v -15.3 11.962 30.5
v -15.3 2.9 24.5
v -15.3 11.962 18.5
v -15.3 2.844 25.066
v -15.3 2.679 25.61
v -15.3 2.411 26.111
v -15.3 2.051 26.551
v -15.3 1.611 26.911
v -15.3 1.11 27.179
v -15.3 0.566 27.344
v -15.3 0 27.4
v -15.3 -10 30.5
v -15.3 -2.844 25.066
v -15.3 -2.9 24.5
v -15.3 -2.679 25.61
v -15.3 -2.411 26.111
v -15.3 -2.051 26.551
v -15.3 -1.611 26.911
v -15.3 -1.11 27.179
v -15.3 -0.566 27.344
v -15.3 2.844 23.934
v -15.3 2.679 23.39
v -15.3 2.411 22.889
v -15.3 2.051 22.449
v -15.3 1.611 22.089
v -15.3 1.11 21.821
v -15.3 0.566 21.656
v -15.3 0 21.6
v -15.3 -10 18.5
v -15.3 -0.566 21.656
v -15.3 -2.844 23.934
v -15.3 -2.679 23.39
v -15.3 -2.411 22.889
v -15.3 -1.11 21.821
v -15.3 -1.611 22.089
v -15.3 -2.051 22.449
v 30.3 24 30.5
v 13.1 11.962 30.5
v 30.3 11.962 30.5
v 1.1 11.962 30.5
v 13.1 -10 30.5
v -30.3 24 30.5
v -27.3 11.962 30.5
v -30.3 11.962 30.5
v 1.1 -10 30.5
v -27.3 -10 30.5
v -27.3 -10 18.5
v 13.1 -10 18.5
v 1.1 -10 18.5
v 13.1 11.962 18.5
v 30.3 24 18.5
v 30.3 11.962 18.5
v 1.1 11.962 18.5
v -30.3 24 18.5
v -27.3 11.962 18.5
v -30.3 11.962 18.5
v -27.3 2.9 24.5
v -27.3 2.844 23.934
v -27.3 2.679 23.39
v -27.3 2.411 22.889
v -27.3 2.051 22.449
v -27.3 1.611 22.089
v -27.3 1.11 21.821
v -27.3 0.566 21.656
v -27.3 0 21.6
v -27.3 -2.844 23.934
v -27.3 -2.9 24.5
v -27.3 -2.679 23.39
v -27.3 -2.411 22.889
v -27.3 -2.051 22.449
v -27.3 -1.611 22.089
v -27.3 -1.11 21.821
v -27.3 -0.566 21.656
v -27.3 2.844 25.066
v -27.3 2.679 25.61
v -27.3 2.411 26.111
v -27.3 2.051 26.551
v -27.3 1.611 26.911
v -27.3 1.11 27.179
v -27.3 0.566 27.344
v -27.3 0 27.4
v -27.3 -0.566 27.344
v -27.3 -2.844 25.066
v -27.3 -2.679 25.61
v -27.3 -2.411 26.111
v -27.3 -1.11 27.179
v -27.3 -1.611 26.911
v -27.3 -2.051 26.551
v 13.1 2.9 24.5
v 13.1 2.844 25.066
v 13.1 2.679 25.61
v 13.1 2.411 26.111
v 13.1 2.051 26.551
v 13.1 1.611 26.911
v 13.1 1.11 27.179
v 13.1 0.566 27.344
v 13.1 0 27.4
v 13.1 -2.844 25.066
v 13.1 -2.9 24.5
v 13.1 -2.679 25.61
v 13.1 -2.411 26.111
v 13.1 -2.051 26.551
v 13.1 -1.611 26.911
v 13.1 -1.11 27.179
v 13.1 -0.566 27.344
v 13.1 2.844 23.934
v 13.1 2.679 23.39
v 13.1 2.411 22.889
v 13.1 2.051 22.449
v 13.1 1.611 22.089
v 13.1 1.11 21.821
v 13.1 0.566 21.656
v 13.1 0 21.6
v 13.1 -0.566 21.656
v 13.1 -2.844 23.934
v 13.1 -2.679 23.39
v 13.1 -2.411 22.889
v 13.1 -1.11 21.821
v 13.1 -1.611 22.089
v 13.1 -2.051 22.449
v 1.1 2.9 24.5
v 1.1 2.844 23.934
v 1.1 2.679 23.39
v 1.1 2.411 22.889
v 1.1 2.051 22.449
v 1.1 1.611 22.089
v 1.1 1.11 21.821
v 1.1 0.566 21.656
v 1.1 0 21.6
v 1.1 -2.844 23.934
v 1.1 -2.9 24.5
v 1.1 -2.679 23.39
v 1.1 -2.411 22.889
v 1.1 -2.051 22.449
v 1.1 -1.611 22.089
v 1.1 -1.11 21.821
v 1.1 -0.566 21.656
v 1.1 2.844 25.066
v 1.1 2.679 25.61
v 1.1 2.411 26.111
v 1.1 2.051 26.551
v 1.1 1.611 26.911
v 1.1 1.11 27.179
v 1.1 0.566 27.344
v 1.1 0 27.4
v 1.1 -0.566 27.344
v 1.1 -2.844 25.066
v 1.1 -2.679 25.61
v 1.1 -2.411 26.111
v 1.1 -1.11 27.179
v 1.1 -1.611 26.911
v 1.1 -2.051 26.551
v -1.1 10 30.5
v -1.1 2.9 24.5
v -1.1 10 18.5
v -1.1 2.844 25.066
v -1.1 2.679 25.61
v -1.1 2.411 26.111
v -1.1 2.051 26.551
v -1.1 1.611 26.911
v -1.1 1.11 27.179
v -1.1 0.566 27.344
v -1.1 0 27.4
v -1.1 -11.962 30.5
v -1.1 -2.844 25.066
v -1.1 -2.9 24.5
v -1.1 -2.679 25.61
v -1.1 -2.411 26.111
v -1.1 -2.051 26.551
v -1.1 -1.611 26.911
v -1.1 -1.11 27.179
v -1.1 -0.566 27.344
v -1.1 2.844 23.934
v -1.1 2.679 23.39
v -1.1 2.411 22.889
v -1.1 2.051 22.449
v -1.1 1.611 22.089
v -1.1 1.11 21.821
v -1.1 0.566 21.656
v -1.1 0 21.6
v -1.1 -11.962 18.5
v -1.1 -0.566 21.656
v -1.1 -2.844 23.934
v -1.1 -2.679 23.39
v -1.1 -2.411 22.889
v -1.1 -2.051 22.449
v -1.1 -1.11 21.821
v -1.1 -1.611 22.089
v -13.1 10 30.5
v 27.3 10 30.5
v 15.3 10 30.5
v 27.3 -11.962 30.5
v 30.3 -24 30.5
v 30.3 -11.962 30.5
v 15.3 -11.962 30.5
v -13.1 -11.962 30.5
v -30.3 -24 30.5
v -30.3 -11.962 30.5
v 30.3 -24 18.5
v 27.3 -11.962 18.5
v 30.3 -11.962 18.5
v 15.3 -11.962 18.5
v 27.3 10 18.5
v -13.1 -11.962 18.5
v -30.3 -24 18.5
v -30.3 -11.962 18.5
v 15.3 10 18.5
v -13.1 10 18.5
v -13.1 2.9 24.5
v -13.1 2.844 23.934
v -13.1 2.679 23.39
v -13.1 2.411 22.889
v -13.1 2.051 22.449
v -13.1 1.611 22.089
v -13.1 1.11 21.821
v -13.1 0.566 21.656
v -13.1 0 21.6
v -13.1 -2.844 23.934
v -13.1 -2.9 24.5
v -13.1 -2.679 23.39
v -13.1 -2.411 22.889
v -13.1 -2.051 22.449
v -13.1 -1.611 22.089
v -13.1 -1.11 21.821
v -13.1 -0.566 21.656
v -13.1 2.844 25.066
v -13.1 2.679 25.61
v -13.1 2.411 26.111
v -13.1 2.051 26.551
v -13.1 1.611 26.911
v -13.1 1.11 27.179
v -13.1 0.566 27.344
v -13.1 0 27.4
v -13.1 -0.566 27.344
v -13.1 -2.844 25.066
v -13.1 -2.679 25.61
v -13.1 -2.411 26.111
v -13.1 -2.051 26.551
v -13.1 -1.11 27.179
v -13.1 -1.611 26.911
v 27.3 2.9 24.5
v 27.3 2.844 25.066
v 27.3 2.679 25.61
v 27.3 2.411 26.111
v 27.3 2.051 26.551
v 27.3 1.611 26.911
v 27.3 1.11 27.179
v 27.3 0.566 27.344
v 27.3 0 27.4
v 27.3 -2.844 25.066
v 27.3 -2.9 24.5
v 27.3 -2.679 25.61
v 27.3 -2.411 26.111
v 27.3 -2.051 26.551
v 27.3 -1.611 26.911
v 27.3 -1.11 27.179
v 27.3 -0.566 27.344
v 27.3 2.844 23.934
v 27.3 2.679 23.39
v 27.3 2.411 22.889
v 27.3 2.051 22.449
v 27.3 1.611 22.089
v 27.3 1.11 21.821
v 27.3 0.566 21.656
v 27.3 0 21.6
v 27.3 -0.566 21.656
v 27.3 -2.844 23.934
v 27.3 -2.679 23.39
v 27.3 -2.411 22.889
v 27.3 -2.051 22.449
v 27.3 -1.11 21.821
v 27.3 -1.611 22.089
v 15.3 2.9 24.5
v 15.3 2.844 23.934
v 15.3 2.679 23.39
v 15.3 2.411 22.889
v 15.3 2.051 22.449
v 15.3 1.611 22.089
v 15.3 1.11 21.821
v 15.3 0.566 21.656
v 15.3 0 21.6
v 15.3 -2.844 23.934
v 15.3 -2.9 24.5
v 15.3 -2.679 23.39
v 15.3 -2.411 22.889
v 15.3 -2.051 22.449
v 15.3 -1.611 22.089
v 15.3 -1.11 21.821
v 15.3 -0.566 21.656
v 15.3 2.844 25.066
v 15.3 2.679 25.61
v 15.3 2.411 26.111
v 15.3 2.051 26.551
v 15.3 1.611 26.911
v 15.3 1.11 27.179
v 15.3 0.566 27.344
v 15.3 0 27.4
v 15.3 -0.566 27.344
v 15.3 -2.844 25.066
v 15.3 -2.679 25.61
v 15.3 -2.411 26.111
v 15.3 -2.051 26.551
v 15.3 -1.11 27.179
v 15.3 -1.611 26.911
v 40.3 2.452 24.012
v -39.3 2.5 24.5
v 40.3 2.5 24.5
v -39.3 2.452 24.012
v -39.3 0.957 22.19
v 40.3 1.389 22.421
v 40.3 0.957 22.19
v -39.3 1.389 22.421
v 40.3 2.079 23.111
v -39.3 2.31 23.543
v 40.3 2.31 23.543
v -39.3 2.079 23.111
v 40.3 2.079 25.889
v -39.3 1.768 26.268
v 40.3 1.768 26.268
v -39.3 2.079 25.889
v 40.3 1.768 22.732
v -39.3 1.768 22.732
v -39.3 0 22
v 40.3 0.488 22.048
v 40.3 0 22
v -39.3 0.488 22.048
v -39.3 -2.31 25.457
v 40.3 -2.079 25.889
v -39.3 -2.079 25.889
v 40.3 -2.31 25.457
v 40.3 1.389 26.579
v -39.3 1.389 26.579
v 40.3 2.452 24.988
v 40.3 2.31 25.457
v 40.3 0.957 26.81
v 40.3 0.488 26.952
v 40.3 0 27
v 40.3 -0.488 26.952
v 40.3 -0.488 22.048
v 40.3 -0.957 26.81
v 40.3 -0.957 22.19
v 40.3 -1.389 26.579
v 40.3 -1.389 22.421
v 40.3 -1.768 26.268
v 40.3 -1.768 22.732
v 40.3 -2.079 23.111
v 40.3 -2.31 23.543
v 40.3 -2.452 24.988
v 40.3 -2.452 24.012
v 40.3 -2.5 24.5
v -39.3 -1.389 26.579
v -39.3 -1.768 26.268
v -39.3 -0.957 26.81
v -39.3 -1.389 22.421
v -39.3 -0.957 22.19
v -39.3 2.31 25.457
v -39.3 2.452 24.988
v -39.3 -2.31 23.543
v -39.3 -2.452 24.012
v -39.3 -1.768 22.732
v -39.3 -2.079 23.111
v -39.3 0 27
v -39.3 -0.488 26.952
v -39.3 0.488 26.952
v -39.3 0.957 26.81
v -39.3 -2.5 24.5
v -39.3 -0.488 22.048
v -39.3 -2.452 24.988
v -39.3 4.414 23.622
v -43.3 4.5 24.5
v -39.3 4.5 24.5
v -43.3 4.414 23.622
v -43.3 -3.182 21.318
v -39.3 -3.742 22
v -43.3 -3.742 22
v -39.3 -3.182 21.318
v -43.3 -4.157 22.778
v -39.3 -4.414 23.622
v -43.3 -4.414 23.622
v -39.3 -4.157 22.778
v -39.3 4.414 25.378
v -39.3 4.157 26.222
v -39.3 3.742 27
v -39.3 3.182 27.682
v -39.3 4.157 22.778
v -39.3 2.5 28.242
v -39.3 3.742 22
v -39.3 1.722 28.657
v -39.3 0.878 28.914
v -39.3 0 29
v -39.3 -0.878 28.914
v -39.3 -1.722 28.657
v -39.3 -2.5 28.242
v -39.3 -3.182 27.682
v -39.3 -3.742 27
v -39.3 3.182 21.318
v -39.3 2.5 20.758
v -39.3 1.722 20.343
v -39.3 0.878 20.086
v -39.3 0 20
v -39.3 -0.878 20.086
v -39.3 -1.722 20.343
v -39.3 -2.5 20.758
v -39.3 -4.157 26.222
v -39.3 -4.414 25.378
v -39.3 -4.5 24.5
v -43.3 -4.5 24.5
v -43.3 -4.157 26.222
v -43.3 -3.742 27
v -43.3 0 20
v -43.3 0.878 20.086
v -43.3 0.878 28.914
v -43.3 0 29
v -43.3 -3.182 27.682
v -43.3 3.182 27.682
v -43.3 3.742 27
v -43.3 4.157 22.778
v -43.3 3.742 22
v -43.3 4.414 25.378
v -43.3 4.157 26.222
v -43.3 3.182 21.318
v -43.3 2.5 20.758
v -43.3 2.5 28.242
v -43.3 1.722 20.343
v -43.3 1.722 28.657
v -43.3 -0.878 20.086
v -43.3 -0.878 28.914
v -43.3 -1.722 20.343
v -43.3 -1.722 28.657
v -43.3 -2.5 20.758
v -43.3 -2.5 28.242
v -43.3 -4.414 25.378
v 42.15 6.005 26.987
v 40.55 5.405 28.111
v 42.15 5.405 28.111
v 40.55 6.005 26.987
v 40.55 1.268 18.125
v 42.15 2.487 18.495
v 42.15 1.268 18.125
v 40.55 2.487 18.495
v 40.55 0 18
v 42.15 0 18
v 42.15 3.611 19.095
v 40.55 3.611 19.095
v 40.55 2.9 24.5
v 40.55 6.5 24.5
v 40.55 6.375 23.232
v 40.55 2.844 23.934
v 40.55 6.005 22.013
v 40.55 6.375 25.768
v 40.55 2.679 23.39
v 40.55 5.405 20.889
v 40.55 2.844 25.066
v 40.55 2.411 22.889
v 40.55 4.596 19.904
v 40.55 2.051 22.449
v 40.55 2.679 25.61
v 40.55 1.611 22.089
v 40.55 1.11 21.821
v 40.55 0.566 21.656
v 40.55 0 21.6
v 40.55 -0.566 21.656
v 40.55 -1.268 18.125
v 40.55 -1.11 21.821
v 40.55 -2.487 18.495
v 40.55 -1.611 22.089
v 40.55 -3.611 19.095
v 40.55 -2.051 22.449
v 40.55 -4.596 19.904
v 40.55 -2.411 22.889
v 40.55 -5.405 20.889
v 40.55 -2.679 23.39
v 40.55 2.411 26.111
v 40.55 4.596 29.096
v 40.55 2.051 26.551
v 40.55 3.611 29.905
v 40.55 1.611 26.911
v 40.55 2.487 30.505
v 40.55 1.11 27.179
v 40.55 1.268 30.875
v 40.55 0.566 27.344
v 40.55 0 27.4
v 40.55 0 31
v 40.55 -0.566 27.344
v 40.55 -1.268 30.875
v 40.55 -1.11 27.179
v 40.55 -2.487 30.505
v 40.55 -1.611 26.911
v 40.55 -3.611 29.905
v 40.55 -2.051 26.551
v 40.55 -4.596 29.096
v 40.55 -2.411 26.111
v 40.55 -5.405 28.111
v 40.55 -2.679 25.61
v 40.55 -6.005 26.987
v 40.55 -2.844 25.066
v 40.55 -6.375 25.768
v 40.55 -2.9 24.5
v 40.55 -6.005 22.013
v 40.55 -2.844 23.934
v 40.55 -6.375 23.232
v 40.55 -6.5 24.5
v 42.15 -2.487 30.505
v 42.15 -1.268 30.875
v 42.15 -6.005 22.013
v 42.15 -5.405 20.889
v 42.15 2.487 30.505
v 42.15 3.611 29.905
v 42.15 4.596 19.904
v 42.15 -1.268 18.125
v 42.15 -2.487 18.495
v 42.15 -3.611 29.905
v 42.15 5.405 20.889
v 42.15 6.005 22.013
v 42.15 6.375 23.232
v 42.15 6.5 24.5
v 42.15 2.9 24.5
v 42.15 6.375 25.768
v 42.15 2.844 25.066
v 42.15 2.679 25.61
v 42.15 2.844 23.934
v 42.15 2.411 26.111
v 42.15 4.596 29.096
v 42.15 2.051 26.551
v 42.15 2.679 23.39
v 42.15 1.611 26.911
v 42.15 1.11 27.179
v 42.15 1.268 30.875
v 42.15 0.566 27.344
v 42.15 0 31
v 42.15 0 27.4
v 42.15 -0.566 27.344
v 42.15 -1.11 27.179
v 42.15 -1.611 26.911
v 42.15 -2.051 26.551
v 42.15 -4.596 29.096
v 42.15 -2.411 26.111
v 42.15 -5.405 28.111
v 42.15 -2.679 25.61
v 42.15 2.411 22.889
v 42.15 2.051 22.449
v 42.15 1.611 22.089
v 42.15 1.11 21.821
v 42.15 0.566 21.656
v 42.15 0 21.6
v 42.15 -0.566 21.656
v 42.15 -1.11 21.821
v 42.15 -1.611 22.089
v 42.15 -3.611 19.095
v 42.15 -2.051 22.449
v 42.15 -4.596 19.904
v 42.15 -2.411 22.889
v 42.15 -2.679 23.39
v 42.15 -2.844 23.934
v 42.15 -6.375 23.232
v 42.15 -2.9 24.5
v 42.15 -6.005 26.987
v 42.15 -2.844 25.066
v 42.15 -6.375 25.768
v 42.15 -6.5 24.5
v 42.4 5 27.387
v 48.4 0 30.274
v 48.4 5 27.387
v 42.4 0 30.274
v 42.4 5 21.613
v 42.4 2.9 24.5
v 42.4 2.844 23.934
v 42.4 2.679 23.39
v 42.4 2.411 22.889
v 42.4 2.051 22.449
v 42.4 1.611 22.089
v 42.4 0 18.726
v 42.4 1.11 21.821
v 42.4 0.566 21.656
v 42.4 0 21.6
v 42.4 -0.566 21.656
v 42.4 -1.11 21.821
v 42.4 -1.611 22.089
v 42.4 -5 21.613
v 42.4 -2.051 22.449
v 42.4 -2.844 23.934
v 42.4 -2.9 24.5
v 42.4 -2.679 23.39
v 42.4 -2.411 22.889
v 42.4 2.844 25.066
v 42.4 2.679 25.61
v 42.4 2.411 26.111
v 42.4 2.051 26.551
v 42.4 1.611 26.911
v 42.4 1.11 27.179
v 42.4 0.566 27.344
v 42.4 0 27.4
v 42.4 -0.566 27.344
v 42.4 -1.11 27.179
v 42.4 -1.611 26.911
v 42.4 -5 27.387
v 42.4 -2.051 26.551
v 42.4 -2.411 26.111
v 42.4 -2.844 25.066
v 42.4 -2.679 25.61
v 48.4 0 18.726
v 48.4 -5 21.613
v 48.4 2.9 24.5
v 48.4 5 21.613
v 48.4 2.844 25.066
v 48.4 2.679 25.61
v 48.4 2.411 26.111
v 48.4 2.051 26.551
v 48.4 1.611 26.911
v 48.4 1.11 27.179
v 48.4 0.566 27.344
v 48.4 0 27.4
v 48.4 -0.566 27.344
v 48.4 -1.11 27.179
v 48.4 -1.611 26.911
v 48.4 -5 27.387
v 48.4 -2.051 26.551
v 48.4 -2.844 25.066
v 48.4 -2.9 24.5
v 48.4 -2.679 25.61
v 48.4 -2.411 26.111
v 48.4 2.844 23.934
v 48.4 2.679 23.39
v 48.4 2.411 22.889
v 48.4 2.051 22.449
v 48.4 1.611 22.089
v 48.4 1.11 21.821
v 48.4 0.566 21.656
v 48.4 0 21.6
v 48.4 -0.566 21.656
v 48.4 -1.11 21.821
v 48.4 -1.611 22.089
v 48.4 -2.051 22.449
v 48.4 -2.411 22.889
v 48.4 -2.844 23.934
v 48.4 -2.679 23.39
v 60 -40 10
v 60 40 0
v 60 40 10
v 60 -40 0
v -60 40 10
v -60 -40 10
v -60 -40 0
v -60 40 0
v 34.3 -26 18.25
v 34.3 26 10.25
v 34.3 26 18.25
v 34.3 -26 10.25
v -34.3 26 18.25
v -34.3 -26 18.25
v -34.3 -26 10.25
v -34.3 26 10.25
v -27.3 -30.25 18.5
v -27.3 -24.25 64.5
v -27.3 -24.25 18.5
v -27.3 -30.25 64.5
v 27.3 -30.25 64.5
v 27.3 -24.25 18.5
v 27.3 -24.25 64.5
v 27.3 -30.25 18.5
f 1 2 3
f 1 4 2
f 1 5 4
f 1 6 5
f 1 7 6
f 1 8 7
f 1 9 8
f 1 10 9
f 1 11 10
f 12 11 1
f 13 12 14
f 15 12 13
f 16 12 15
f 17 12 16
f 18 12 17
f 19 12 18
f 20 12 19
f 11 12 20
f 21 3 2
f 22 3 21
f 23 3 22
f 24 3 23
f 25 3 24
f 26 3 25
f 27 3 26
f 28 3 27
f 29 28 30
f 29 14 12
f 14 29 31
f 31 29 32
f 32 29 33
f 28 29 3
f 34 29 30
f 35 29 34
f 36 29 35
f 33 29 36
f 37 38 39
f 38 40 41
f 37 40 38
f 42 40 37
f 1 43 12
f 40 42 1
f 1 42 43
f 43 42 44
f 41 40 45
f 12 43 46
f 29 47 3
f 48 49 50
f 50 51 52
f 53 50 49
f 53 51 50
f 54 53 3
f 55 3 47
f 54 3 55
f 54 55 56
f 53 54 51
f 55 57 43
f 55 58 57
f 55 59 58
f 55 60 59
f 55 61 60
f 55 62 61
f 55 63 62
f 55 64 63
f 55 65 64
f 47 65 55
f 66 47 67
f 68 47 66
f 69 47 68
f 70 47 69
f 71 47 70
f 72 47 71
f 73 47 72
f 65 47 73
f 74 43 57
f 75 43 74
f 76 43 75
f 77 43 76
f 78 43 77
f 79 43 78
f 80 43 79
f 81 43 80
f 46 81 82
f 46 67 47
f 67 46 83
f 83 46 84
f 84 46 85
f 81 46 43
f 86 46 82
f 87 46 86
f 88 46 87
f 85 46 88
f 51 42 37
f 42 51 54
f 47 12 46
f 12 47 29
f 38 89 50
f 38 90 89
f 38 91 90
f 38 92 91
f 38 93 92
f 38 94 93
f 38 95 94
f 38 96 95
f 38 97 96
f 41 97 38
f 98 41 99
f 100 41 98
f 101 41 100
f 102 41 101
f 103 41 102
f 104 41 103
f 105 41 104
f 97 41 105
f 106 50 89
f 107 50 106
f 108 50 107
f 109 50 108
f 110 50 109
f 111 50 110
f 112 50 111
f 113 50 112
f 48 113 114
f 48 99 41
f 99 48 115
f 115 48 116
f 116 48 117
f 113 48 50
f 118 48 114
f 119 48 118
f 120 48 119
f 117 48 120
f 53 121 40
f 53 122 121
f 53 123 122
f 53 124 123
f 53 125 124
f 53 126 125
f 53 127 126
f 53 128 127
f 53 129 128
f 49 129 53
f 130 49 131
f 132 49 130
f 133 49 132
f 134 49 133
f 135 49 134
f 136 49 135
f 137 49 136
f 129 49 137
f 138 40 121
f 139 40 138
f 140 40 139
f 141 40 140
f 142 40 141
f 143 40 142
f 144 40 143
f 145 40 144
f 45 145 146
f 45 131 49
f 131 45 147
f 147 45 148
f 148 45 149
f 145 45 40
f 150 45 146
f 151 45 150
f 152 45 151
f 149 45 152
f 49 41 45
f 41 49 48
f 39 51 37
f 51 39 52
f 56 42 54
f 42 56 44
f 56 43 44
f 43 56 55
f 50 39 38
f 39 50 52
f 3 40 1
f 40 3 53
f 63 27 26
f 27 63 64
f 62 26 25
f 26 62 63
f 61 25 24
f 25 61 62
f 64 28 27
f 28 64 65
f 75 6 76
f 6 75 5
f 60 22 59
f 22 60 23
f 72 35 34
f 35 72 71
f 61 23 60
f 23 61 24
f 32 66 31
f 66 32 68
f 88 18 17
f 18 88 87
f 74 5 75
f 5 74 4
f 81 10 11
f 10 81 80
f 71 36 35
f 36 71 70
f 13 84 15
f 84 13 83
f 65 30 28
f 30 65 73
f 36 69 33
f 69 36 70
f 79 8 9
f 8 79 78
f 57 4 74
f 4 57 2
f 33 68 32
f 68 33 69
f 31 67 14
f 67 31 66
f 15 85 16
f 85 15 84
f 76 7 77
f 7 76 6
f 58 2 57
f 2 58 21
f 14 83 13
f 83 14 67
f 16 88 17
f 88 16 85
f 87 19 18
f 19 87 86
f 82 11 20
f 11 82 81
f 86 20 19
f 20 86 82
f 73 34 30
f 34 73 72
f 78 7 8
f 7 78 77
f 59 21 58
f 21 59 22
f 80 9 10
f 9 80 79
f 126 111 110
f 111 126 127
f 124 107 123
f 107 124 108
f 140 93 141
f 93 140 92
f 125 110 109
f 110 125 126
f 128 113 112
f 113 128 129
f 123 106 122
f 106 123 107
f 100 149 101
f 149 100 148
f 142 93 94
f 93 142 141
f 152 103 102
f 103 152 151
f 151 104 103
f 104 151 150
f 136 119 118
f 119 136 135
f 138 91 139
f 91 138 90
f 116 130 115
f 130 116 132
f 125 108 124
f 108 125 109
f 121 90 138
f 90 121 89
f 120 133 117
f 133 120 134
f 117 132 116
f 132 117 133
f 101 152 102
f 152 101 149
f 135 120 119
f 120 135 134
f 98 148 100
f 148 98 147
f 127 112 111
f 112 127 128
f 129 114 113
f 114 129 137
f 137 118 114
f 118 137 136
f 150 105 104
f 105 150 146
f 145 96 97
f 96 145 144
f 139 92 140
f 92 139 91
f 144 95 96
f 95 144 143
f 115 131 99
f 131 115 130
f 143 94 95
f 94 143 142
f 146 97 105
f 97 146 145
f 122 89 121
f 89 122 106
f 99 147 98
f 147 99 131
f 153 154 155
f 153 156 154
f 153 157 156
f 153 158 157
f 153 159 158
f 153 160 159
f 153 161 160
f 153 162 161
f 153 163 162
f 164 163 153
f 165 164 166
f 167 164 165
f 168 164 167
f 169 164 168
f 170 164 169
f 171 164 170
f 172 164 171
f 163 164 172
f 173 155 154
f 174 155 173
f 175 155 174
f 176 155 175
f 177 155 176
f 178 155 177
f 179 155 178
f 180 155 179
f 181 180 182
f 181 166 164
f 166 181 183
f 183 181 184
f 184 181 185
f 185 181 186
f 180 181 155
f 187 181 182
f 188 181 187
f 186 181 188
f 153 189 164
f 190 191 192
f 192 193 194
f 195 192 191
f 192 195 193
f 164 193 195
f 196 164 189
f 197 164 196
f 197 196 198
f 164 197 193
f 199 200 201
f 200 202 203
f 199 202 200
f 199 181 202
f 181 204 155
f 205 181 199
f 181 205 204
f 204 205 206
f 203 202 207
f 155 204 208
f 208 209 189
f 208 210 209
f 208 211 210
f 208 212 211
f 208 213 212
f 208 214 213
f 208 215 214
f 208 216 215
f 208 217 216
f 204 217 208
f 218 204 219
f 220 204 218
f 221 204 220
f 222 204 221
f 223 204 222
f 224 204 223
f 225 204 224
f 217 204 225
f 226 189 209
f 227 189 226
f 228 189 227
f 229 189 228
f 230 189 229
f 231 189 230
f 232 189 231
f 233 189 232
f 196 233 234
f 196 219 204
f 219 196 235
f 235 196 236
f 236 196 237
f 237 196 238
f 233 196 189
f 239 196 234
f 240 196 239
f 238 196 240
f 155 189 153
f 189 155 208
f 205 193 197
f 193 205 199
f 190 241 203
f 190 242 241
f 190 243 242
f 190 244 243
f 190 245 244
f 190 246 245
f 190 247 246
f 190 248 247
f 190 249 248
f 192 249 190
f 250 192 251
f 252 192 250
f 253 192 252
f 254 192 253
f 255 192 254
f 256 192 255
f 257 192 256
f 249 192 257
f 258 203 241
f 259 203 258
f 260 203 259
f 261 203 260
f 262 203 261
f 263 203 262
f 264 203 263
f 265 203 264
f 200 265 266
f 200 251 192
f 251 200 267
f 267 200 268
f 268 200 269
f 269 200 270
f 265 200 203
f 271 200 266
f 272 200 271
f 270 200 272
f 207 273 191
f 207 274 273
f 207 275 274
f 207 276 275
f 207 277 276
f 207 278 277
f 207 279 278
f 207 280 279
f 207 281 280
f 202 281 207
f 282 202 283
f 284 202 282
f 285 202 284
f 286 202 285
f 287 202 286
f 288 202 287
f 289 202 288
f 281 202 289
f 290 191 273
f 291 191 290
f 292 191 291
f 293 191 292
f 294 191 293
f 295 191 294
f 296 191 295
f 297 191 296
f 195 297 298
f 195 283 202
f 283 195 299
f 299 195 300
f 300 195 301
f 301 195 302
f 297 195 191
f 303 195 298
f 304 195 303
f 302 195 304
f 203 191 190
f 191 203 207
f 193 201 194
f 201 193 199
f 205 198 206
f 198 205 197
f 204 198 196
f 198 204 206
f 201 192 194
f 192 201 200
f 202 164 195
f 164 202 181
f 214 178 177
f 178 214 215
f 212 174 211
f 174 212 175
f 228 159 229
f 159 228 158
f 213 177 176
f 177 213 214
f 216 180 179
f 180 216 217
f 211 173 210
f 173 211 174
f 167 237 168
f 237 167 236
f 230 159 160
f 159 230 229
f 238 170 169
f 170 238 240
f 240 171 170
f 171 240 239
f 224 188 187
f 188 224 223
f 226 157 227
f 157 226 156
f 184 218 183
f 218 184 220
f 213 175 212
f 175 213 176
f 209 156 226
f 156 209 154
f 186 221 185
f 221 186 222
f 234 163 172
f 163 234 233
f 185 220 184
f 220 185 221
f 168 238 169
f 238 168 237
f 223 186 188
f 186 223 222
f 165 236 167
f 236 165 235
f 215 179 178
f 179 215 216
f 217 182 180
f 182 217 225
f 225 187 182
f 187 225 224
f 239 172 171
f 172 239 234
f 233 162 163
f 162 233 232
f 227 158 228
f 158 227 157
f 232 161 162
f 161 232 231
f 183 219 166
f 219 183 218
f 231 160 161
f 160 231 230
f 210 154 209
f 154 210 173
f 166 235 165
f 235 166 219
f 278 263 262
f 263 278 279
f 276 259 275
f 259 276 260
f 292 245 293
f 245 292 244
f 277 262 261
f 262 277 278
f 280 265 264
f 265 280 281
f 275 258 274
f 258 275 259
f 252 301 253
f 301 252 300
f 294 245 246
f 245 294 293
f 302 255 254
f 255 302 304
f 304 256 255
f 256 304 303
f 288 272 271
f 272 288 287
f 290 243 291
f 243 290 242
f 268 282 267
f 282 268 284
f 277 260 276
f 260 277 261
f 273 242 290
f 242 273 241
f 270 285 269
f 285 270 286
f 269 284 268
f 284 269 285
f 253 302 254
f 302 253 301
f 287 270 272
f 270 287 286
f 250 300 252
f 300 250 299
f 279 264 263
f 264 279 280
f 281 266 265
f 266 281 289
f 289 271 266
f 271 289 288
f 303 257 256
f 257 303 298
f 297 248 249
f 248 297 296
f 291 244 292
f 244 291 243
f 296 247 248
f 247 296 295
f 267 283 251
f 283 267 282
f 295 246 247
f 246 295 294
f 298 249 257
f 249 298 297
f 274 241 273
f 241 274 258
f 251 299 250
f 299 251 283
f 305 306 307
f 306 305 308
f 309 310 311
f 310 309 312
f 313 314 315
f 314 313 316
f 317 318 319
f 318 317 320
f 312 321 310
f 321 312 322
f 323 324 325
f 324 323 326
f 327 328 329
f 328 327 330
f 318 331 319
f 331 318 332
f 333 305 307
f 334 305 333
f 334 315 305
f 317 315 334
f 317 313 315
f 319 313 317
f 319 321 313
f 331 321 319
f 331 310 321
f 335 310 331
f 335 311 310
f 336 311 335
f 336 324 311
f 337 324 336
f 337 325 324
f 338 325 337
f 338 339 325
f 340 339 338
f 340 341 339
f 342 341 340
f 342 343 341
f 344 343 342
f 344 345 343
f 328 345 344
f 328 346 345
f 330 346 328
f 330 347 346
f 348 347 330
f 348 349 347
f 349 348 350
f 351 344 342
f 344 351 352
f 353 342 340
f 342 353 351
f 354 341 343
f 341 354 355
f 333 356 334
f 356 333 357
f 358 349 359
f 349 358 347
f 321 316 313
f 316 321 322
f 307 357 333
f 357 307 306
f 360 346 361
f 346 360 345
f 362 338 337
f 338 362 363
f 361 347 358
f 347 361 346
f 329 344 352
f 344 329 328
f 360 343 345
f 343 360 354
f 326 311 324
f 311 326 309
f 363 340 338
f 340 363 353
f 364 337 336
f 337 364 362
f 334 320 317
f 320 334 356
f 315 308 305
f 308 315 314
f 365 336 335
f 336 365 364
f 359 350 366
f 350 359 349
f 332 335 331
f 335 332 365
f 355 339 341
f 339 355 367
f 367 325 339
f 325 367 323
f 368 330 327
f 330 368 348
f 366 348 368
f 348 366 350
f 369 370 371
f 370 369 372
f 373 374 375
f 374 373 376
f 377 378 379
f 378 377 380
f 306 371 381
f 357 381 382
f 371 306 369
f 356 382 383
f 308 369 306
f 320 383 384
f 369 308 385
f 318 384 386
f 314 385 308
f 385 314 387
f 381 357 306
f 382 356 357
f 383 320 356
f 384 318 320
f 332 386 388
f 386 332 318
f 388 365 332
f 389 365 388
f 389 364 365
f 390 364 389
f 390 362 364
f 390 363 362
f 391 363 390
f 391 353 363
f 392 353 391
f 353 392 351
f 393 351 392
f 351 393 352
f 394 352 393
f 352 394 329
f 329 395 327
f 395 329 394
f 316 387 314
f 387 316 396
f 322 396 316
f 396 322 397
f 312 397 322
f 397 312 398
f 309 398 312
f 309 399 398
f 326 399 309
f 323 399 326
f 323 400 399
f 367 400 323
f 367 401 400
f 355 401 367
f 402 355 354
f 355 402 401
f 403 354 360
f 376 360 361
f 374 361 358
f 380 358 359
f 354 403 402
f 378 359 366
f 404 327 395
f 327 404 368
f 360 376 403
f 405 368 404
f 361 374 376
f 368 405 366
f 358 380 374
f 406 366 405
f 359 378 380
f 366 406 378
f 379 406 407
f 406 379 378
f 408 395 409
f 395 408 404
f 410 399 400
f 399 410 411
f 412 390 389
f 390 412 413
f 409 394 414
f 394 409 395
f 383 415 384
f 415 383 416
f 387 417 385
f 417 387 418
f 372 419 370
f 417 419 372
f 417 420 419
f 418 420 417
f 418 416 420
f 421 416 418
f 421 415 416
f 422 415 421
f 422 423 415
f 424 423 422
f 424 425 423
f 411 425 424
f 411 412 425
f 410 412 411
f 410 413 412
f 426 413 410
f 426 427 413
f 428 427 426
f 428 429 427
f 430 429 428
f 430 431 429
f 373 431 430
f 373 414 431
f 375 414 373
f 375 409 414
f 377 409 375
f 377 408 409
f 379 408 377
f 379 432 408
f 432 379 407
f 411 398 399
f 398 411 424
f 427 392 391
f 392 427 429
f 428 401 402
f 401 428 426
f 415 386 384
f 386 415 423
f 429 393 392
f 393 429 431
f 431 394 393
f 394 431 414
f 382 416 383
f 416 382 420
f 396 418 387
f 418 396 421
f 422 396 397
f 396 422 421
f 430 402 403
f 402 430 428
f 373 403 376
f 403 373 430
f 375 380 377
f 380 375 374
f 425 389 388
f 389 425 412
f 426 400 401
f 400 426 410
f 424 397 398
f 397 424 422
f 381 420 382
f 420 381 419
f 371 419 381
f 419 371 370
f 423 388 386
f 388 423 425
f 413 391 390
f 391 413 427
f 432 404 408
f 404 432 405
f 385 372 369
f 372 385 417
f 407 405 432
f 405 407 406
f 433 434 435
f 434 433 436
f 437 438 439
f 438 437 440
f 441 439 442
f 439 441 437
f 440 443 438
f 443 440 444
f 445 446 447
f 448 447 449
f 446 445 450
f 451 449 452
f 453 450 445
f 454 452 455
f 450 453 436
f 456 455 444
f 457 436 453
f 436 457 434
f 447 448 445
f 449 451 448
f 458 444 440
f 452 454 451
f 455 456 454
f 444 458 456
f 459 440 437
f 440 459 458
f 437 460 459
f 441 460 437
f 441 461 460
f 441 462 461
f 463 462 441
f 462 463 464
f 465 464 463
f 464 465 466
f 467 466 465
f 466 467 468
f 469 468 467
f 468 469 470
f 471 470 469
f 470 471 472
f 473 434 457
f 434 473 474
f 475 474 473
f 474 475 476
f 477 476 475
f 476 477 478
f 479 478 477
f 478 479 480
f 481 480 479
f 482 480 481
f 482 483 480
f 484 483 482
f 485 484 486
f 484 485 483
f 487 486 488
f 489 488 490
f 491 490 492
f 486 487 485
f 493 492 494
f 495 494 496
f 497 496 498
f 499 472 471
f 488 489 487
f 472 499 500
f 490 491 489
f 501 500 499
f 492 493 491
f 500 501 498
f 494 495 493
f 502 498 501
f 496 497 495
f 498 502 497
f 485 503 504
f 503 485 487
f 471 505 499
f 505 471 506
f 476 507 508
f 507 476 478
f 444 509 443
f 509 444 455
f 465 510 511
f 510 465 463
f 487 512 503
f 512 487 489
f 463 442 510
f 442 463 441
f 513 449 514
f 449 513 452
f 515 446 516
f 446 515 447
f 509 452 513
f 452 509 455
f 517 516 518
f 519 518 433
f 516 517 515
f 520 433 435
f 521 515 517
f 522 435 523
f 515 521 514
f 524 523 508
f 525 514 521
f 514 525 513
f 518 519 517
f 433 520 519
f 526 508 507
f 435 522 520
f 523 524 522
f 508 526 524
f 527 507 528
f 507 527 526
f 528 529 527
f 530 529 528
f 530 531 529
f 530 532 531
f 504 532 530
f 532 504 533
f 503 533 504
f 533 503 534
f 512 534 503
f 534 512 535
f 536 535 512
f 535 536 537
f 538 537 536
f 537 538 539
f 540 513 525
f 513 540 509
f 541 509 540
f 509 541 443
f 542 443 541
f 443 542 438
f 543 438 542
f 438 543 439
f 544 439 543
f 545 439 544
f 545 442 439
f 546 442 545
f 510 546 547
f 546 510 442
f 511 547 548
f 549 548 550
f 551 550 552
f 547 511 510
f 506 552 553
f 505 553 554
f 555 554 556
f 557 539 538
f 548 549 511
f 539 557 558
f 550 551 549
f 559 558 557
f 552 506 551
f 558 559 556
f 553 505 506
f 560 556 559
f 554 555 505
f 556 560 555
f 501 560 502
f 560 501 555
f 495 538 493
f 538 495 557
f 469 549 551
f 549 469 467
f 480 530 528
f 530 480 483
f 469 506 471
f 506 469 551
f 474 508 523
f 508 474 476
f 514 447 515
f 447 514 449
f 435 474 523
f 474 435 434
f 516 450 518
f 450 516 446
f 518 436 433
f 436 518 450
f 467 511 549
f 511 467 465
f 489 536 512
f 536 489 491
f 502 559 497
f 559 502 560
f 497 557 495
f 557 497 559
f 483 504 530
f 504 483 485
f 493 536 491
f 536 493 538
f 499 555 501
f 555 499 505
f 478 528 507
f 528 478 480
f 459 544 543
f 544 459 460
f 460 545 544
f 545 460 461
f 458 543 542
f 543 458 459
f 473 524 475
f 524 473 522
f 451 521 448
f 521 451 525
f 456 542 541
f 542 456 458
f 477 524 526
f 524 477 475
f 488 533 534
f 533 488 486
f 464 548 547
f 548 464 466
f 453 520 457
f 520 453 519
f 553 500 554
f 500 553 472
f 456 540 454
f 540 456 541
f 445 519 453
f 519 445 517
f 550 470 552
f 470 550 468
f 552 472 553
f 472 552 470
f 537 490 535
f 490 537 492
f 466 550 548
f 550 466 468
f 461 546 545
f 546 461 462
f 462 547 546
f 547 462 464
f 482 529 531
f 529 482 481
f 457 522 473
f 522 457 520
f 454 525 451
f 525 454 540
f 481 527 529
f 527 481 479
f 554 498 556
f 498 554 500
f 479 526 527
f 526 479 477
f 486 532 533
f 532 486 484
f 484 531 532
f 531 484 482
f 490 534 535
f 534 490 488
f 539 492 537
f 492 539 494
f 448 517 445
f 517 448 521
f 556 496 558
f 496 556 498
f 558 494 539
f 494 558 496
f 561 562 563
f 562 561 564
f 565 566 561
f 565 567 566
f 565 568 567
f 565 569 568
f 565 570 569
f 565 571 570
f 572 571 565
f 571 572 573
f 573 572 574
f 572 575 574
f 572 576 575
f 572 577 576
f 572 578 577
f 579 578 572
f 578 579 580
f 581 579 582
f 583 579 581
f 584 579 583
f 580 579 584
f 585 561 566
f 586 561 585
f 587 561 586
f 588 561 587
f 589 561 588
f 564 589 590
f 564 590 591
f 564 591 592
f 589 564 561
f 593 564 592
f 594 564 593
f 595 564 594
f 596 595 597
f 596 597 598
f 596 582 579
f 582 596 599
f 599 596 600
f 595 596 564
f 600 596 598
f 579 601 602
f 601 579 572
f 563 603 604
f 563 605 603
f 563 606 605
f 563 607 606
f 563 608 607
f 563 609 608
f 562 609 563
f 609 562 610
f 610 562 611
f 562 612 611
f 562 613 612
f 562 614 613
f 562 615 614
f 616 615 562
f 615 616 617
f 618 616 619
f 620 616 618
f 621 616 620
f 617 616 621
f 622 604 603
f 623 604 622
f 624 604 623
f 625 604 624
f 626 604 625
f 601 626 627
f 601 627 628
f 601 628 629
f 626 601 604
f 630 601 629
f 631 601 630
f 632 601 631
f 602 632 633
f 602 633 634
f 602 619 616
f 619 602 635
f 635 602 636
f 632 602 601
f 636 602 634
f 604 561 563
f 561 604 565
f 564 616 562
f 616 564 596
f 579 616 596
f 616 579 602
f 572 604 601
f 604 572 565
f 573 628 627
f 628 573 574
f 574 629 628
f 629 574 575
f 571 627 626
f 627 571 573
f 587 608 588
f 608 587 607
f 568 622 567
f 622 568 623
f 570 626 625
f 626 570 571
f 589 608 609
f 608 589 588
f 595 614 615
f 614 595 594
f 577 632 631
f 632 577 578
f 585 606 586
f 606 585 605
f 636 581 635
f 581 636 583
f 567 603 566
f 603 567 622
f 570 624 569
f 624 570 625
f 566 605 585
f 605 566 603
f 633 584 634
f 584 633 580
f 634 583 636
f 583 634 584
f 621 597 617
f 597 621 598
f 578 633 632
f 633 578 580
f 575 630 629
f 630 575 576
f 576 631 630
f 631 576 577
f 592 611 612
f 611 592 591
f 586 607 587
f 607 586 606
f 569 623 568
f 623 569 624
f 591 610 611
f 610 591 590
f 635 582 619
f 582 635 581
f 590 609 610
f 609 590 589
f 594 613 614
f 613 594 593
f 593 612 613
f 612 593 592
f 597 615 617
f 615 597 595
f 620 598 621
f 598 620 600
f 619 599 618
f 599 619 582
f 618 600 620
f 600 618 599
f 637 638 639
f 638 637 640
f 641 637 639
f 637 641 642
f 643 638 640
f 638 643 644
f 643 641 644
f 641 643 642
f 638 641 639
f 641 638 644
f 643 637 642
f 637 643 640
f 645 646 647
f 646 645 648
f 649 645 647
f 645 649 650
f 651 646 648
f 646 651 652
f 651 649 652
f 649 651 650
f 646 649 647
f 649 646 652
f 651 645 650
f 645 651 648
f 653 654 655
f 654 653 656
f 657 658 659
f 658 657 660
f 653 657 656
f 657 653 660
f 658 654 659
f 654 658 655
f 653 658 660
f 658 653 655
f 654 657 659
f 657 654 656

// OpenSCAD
$fn = 32;

// ------------------------------------------------------------------------
// Comb hinge with flap: leaf 60.6 x 24 mm, pin d5, flap 46 mm
// Every part is its own module, assembly() places every instance.
// ------------------------------------------------------------------------

// --- part 1 ---
module hinge_bed() {
  difference() {
    translate([-60, -40, 0]) cube([120, 80, 10]);
  }
}

// --- part 2 ---
module hinge_riser() {
  difference() {
    translate([-34.3, -26, 0]) cube([68.6, 52, 8]);
  }
}

// --- part 3 ---
module hinge_leaf_a() {
  difference() {
    union() {
      translate([-27.3, -10, -6]) cube([12, 34, 12]);
      translate([1.1, -10, -6]) cube([12, 34, 12]);
      translate([-30.3, 11.962, -6]) cube([60.6, 12.038, 12]);
    }
    translate([-21.3, 0, 0]) rotate([0, 90, 0]) cylinder(h = 14, d = 5.8, center = true);
    translate([7.1, 0, 0]) rotate([0, 90, 0]) cylinder(h = 14, d = 5.8, center = true);
  }
}

// --- part 4 ---
module hinge_leaf_b() {
  difference() {
    union() {
      translate([-13.1, -24, -6]) cube([12, 34, 12]);
      translate([15.3, -24, -6]) cube([12, 34, 12]);
      translate([-30.3, -24, -6]) cube([60.6, 12.038, 12]);
    }
    translate([-7.1, 0, 0]) rotate([0, 90, 0]) cylinder(h = 14, d = 5.8, center = true);
    translate([21.3, 0, 0]) rotate([0, 90, 0]) cylinder(h = 14, d = 5.8, center = true);
  }
}

// --- part 5 ---
module hinge_flap() {
  difference() {
    translate([-27.3, -23, 0]) cube([54.6, 46, 6]);
  }
}

// --- part 6 ---
module hinge_pin() {
  rotate([0, 90, 0]) cylinder(h = 80.6, d = 5, center = true);
  translate([-43.3, 0, 0]) rotate([0, 90, 0]) cylinder(h = 4, d = 9);
}

// --- part 7 ---
module pin_washer() {
  difference() {
      translate([0, 0, 0]) cylinder(h = 1.6, d = 13);
      translate([0, 0, -1]) cylinder(h = 3.6, d = 5.8);
    }
}

// --- part 8 ---
module pin_nut() {
  difference() {
    linear_extrude(height = 6) polygon(points = [[5.774, 0], [2.887, 5], [-2.887, 5], [-5.774, 0], [-2.887, -5], [2.887, -5]]);
    translate([0, 0, -1]) cylinder(h = 8, d = 5.8);
  }
}

// --- assembly ---
module assembly() {
  color([0.80, 0.24, 0.20]) translate([0, 0, 0]) rotate([0, 0, 0]) hinge_bed();
  color([0.20, 0.45, 0.75]) translate([0, 0, 10.25]) rotate([0, 0, 0]) hinge_riser();
  color([0.25, 0.62, 0.32]) translate([0, 0, 24.5]) rotate([0, 0, 0]) hinge_leaf_a();
  color([0.92, 0.70, 0.18]) translate([0, 0, 24.5]) rotate([0, 0, 0]) hinge_leaf_b();
  color([0.58, 0.35, 0.70]) translate([0, -24.25, 41.5]) rotate([90, 0, 0]) hinge_flap();
  color([0.16, 0.66, 0.66]) translate([0, 0, 24.5]) rotate([0, 0, 0]) hinge_pin();
  color([0.85, 0.48, 0.18]) translate([40.55, 0, 24.5]) rotate([0, 90, 0]) pin_washer();
  color([0.55, 0.60, 0.65]) translate([42.4, 0, 24.5]) rotate([0, 90, 0]) pin_nut();
}

assembly();
